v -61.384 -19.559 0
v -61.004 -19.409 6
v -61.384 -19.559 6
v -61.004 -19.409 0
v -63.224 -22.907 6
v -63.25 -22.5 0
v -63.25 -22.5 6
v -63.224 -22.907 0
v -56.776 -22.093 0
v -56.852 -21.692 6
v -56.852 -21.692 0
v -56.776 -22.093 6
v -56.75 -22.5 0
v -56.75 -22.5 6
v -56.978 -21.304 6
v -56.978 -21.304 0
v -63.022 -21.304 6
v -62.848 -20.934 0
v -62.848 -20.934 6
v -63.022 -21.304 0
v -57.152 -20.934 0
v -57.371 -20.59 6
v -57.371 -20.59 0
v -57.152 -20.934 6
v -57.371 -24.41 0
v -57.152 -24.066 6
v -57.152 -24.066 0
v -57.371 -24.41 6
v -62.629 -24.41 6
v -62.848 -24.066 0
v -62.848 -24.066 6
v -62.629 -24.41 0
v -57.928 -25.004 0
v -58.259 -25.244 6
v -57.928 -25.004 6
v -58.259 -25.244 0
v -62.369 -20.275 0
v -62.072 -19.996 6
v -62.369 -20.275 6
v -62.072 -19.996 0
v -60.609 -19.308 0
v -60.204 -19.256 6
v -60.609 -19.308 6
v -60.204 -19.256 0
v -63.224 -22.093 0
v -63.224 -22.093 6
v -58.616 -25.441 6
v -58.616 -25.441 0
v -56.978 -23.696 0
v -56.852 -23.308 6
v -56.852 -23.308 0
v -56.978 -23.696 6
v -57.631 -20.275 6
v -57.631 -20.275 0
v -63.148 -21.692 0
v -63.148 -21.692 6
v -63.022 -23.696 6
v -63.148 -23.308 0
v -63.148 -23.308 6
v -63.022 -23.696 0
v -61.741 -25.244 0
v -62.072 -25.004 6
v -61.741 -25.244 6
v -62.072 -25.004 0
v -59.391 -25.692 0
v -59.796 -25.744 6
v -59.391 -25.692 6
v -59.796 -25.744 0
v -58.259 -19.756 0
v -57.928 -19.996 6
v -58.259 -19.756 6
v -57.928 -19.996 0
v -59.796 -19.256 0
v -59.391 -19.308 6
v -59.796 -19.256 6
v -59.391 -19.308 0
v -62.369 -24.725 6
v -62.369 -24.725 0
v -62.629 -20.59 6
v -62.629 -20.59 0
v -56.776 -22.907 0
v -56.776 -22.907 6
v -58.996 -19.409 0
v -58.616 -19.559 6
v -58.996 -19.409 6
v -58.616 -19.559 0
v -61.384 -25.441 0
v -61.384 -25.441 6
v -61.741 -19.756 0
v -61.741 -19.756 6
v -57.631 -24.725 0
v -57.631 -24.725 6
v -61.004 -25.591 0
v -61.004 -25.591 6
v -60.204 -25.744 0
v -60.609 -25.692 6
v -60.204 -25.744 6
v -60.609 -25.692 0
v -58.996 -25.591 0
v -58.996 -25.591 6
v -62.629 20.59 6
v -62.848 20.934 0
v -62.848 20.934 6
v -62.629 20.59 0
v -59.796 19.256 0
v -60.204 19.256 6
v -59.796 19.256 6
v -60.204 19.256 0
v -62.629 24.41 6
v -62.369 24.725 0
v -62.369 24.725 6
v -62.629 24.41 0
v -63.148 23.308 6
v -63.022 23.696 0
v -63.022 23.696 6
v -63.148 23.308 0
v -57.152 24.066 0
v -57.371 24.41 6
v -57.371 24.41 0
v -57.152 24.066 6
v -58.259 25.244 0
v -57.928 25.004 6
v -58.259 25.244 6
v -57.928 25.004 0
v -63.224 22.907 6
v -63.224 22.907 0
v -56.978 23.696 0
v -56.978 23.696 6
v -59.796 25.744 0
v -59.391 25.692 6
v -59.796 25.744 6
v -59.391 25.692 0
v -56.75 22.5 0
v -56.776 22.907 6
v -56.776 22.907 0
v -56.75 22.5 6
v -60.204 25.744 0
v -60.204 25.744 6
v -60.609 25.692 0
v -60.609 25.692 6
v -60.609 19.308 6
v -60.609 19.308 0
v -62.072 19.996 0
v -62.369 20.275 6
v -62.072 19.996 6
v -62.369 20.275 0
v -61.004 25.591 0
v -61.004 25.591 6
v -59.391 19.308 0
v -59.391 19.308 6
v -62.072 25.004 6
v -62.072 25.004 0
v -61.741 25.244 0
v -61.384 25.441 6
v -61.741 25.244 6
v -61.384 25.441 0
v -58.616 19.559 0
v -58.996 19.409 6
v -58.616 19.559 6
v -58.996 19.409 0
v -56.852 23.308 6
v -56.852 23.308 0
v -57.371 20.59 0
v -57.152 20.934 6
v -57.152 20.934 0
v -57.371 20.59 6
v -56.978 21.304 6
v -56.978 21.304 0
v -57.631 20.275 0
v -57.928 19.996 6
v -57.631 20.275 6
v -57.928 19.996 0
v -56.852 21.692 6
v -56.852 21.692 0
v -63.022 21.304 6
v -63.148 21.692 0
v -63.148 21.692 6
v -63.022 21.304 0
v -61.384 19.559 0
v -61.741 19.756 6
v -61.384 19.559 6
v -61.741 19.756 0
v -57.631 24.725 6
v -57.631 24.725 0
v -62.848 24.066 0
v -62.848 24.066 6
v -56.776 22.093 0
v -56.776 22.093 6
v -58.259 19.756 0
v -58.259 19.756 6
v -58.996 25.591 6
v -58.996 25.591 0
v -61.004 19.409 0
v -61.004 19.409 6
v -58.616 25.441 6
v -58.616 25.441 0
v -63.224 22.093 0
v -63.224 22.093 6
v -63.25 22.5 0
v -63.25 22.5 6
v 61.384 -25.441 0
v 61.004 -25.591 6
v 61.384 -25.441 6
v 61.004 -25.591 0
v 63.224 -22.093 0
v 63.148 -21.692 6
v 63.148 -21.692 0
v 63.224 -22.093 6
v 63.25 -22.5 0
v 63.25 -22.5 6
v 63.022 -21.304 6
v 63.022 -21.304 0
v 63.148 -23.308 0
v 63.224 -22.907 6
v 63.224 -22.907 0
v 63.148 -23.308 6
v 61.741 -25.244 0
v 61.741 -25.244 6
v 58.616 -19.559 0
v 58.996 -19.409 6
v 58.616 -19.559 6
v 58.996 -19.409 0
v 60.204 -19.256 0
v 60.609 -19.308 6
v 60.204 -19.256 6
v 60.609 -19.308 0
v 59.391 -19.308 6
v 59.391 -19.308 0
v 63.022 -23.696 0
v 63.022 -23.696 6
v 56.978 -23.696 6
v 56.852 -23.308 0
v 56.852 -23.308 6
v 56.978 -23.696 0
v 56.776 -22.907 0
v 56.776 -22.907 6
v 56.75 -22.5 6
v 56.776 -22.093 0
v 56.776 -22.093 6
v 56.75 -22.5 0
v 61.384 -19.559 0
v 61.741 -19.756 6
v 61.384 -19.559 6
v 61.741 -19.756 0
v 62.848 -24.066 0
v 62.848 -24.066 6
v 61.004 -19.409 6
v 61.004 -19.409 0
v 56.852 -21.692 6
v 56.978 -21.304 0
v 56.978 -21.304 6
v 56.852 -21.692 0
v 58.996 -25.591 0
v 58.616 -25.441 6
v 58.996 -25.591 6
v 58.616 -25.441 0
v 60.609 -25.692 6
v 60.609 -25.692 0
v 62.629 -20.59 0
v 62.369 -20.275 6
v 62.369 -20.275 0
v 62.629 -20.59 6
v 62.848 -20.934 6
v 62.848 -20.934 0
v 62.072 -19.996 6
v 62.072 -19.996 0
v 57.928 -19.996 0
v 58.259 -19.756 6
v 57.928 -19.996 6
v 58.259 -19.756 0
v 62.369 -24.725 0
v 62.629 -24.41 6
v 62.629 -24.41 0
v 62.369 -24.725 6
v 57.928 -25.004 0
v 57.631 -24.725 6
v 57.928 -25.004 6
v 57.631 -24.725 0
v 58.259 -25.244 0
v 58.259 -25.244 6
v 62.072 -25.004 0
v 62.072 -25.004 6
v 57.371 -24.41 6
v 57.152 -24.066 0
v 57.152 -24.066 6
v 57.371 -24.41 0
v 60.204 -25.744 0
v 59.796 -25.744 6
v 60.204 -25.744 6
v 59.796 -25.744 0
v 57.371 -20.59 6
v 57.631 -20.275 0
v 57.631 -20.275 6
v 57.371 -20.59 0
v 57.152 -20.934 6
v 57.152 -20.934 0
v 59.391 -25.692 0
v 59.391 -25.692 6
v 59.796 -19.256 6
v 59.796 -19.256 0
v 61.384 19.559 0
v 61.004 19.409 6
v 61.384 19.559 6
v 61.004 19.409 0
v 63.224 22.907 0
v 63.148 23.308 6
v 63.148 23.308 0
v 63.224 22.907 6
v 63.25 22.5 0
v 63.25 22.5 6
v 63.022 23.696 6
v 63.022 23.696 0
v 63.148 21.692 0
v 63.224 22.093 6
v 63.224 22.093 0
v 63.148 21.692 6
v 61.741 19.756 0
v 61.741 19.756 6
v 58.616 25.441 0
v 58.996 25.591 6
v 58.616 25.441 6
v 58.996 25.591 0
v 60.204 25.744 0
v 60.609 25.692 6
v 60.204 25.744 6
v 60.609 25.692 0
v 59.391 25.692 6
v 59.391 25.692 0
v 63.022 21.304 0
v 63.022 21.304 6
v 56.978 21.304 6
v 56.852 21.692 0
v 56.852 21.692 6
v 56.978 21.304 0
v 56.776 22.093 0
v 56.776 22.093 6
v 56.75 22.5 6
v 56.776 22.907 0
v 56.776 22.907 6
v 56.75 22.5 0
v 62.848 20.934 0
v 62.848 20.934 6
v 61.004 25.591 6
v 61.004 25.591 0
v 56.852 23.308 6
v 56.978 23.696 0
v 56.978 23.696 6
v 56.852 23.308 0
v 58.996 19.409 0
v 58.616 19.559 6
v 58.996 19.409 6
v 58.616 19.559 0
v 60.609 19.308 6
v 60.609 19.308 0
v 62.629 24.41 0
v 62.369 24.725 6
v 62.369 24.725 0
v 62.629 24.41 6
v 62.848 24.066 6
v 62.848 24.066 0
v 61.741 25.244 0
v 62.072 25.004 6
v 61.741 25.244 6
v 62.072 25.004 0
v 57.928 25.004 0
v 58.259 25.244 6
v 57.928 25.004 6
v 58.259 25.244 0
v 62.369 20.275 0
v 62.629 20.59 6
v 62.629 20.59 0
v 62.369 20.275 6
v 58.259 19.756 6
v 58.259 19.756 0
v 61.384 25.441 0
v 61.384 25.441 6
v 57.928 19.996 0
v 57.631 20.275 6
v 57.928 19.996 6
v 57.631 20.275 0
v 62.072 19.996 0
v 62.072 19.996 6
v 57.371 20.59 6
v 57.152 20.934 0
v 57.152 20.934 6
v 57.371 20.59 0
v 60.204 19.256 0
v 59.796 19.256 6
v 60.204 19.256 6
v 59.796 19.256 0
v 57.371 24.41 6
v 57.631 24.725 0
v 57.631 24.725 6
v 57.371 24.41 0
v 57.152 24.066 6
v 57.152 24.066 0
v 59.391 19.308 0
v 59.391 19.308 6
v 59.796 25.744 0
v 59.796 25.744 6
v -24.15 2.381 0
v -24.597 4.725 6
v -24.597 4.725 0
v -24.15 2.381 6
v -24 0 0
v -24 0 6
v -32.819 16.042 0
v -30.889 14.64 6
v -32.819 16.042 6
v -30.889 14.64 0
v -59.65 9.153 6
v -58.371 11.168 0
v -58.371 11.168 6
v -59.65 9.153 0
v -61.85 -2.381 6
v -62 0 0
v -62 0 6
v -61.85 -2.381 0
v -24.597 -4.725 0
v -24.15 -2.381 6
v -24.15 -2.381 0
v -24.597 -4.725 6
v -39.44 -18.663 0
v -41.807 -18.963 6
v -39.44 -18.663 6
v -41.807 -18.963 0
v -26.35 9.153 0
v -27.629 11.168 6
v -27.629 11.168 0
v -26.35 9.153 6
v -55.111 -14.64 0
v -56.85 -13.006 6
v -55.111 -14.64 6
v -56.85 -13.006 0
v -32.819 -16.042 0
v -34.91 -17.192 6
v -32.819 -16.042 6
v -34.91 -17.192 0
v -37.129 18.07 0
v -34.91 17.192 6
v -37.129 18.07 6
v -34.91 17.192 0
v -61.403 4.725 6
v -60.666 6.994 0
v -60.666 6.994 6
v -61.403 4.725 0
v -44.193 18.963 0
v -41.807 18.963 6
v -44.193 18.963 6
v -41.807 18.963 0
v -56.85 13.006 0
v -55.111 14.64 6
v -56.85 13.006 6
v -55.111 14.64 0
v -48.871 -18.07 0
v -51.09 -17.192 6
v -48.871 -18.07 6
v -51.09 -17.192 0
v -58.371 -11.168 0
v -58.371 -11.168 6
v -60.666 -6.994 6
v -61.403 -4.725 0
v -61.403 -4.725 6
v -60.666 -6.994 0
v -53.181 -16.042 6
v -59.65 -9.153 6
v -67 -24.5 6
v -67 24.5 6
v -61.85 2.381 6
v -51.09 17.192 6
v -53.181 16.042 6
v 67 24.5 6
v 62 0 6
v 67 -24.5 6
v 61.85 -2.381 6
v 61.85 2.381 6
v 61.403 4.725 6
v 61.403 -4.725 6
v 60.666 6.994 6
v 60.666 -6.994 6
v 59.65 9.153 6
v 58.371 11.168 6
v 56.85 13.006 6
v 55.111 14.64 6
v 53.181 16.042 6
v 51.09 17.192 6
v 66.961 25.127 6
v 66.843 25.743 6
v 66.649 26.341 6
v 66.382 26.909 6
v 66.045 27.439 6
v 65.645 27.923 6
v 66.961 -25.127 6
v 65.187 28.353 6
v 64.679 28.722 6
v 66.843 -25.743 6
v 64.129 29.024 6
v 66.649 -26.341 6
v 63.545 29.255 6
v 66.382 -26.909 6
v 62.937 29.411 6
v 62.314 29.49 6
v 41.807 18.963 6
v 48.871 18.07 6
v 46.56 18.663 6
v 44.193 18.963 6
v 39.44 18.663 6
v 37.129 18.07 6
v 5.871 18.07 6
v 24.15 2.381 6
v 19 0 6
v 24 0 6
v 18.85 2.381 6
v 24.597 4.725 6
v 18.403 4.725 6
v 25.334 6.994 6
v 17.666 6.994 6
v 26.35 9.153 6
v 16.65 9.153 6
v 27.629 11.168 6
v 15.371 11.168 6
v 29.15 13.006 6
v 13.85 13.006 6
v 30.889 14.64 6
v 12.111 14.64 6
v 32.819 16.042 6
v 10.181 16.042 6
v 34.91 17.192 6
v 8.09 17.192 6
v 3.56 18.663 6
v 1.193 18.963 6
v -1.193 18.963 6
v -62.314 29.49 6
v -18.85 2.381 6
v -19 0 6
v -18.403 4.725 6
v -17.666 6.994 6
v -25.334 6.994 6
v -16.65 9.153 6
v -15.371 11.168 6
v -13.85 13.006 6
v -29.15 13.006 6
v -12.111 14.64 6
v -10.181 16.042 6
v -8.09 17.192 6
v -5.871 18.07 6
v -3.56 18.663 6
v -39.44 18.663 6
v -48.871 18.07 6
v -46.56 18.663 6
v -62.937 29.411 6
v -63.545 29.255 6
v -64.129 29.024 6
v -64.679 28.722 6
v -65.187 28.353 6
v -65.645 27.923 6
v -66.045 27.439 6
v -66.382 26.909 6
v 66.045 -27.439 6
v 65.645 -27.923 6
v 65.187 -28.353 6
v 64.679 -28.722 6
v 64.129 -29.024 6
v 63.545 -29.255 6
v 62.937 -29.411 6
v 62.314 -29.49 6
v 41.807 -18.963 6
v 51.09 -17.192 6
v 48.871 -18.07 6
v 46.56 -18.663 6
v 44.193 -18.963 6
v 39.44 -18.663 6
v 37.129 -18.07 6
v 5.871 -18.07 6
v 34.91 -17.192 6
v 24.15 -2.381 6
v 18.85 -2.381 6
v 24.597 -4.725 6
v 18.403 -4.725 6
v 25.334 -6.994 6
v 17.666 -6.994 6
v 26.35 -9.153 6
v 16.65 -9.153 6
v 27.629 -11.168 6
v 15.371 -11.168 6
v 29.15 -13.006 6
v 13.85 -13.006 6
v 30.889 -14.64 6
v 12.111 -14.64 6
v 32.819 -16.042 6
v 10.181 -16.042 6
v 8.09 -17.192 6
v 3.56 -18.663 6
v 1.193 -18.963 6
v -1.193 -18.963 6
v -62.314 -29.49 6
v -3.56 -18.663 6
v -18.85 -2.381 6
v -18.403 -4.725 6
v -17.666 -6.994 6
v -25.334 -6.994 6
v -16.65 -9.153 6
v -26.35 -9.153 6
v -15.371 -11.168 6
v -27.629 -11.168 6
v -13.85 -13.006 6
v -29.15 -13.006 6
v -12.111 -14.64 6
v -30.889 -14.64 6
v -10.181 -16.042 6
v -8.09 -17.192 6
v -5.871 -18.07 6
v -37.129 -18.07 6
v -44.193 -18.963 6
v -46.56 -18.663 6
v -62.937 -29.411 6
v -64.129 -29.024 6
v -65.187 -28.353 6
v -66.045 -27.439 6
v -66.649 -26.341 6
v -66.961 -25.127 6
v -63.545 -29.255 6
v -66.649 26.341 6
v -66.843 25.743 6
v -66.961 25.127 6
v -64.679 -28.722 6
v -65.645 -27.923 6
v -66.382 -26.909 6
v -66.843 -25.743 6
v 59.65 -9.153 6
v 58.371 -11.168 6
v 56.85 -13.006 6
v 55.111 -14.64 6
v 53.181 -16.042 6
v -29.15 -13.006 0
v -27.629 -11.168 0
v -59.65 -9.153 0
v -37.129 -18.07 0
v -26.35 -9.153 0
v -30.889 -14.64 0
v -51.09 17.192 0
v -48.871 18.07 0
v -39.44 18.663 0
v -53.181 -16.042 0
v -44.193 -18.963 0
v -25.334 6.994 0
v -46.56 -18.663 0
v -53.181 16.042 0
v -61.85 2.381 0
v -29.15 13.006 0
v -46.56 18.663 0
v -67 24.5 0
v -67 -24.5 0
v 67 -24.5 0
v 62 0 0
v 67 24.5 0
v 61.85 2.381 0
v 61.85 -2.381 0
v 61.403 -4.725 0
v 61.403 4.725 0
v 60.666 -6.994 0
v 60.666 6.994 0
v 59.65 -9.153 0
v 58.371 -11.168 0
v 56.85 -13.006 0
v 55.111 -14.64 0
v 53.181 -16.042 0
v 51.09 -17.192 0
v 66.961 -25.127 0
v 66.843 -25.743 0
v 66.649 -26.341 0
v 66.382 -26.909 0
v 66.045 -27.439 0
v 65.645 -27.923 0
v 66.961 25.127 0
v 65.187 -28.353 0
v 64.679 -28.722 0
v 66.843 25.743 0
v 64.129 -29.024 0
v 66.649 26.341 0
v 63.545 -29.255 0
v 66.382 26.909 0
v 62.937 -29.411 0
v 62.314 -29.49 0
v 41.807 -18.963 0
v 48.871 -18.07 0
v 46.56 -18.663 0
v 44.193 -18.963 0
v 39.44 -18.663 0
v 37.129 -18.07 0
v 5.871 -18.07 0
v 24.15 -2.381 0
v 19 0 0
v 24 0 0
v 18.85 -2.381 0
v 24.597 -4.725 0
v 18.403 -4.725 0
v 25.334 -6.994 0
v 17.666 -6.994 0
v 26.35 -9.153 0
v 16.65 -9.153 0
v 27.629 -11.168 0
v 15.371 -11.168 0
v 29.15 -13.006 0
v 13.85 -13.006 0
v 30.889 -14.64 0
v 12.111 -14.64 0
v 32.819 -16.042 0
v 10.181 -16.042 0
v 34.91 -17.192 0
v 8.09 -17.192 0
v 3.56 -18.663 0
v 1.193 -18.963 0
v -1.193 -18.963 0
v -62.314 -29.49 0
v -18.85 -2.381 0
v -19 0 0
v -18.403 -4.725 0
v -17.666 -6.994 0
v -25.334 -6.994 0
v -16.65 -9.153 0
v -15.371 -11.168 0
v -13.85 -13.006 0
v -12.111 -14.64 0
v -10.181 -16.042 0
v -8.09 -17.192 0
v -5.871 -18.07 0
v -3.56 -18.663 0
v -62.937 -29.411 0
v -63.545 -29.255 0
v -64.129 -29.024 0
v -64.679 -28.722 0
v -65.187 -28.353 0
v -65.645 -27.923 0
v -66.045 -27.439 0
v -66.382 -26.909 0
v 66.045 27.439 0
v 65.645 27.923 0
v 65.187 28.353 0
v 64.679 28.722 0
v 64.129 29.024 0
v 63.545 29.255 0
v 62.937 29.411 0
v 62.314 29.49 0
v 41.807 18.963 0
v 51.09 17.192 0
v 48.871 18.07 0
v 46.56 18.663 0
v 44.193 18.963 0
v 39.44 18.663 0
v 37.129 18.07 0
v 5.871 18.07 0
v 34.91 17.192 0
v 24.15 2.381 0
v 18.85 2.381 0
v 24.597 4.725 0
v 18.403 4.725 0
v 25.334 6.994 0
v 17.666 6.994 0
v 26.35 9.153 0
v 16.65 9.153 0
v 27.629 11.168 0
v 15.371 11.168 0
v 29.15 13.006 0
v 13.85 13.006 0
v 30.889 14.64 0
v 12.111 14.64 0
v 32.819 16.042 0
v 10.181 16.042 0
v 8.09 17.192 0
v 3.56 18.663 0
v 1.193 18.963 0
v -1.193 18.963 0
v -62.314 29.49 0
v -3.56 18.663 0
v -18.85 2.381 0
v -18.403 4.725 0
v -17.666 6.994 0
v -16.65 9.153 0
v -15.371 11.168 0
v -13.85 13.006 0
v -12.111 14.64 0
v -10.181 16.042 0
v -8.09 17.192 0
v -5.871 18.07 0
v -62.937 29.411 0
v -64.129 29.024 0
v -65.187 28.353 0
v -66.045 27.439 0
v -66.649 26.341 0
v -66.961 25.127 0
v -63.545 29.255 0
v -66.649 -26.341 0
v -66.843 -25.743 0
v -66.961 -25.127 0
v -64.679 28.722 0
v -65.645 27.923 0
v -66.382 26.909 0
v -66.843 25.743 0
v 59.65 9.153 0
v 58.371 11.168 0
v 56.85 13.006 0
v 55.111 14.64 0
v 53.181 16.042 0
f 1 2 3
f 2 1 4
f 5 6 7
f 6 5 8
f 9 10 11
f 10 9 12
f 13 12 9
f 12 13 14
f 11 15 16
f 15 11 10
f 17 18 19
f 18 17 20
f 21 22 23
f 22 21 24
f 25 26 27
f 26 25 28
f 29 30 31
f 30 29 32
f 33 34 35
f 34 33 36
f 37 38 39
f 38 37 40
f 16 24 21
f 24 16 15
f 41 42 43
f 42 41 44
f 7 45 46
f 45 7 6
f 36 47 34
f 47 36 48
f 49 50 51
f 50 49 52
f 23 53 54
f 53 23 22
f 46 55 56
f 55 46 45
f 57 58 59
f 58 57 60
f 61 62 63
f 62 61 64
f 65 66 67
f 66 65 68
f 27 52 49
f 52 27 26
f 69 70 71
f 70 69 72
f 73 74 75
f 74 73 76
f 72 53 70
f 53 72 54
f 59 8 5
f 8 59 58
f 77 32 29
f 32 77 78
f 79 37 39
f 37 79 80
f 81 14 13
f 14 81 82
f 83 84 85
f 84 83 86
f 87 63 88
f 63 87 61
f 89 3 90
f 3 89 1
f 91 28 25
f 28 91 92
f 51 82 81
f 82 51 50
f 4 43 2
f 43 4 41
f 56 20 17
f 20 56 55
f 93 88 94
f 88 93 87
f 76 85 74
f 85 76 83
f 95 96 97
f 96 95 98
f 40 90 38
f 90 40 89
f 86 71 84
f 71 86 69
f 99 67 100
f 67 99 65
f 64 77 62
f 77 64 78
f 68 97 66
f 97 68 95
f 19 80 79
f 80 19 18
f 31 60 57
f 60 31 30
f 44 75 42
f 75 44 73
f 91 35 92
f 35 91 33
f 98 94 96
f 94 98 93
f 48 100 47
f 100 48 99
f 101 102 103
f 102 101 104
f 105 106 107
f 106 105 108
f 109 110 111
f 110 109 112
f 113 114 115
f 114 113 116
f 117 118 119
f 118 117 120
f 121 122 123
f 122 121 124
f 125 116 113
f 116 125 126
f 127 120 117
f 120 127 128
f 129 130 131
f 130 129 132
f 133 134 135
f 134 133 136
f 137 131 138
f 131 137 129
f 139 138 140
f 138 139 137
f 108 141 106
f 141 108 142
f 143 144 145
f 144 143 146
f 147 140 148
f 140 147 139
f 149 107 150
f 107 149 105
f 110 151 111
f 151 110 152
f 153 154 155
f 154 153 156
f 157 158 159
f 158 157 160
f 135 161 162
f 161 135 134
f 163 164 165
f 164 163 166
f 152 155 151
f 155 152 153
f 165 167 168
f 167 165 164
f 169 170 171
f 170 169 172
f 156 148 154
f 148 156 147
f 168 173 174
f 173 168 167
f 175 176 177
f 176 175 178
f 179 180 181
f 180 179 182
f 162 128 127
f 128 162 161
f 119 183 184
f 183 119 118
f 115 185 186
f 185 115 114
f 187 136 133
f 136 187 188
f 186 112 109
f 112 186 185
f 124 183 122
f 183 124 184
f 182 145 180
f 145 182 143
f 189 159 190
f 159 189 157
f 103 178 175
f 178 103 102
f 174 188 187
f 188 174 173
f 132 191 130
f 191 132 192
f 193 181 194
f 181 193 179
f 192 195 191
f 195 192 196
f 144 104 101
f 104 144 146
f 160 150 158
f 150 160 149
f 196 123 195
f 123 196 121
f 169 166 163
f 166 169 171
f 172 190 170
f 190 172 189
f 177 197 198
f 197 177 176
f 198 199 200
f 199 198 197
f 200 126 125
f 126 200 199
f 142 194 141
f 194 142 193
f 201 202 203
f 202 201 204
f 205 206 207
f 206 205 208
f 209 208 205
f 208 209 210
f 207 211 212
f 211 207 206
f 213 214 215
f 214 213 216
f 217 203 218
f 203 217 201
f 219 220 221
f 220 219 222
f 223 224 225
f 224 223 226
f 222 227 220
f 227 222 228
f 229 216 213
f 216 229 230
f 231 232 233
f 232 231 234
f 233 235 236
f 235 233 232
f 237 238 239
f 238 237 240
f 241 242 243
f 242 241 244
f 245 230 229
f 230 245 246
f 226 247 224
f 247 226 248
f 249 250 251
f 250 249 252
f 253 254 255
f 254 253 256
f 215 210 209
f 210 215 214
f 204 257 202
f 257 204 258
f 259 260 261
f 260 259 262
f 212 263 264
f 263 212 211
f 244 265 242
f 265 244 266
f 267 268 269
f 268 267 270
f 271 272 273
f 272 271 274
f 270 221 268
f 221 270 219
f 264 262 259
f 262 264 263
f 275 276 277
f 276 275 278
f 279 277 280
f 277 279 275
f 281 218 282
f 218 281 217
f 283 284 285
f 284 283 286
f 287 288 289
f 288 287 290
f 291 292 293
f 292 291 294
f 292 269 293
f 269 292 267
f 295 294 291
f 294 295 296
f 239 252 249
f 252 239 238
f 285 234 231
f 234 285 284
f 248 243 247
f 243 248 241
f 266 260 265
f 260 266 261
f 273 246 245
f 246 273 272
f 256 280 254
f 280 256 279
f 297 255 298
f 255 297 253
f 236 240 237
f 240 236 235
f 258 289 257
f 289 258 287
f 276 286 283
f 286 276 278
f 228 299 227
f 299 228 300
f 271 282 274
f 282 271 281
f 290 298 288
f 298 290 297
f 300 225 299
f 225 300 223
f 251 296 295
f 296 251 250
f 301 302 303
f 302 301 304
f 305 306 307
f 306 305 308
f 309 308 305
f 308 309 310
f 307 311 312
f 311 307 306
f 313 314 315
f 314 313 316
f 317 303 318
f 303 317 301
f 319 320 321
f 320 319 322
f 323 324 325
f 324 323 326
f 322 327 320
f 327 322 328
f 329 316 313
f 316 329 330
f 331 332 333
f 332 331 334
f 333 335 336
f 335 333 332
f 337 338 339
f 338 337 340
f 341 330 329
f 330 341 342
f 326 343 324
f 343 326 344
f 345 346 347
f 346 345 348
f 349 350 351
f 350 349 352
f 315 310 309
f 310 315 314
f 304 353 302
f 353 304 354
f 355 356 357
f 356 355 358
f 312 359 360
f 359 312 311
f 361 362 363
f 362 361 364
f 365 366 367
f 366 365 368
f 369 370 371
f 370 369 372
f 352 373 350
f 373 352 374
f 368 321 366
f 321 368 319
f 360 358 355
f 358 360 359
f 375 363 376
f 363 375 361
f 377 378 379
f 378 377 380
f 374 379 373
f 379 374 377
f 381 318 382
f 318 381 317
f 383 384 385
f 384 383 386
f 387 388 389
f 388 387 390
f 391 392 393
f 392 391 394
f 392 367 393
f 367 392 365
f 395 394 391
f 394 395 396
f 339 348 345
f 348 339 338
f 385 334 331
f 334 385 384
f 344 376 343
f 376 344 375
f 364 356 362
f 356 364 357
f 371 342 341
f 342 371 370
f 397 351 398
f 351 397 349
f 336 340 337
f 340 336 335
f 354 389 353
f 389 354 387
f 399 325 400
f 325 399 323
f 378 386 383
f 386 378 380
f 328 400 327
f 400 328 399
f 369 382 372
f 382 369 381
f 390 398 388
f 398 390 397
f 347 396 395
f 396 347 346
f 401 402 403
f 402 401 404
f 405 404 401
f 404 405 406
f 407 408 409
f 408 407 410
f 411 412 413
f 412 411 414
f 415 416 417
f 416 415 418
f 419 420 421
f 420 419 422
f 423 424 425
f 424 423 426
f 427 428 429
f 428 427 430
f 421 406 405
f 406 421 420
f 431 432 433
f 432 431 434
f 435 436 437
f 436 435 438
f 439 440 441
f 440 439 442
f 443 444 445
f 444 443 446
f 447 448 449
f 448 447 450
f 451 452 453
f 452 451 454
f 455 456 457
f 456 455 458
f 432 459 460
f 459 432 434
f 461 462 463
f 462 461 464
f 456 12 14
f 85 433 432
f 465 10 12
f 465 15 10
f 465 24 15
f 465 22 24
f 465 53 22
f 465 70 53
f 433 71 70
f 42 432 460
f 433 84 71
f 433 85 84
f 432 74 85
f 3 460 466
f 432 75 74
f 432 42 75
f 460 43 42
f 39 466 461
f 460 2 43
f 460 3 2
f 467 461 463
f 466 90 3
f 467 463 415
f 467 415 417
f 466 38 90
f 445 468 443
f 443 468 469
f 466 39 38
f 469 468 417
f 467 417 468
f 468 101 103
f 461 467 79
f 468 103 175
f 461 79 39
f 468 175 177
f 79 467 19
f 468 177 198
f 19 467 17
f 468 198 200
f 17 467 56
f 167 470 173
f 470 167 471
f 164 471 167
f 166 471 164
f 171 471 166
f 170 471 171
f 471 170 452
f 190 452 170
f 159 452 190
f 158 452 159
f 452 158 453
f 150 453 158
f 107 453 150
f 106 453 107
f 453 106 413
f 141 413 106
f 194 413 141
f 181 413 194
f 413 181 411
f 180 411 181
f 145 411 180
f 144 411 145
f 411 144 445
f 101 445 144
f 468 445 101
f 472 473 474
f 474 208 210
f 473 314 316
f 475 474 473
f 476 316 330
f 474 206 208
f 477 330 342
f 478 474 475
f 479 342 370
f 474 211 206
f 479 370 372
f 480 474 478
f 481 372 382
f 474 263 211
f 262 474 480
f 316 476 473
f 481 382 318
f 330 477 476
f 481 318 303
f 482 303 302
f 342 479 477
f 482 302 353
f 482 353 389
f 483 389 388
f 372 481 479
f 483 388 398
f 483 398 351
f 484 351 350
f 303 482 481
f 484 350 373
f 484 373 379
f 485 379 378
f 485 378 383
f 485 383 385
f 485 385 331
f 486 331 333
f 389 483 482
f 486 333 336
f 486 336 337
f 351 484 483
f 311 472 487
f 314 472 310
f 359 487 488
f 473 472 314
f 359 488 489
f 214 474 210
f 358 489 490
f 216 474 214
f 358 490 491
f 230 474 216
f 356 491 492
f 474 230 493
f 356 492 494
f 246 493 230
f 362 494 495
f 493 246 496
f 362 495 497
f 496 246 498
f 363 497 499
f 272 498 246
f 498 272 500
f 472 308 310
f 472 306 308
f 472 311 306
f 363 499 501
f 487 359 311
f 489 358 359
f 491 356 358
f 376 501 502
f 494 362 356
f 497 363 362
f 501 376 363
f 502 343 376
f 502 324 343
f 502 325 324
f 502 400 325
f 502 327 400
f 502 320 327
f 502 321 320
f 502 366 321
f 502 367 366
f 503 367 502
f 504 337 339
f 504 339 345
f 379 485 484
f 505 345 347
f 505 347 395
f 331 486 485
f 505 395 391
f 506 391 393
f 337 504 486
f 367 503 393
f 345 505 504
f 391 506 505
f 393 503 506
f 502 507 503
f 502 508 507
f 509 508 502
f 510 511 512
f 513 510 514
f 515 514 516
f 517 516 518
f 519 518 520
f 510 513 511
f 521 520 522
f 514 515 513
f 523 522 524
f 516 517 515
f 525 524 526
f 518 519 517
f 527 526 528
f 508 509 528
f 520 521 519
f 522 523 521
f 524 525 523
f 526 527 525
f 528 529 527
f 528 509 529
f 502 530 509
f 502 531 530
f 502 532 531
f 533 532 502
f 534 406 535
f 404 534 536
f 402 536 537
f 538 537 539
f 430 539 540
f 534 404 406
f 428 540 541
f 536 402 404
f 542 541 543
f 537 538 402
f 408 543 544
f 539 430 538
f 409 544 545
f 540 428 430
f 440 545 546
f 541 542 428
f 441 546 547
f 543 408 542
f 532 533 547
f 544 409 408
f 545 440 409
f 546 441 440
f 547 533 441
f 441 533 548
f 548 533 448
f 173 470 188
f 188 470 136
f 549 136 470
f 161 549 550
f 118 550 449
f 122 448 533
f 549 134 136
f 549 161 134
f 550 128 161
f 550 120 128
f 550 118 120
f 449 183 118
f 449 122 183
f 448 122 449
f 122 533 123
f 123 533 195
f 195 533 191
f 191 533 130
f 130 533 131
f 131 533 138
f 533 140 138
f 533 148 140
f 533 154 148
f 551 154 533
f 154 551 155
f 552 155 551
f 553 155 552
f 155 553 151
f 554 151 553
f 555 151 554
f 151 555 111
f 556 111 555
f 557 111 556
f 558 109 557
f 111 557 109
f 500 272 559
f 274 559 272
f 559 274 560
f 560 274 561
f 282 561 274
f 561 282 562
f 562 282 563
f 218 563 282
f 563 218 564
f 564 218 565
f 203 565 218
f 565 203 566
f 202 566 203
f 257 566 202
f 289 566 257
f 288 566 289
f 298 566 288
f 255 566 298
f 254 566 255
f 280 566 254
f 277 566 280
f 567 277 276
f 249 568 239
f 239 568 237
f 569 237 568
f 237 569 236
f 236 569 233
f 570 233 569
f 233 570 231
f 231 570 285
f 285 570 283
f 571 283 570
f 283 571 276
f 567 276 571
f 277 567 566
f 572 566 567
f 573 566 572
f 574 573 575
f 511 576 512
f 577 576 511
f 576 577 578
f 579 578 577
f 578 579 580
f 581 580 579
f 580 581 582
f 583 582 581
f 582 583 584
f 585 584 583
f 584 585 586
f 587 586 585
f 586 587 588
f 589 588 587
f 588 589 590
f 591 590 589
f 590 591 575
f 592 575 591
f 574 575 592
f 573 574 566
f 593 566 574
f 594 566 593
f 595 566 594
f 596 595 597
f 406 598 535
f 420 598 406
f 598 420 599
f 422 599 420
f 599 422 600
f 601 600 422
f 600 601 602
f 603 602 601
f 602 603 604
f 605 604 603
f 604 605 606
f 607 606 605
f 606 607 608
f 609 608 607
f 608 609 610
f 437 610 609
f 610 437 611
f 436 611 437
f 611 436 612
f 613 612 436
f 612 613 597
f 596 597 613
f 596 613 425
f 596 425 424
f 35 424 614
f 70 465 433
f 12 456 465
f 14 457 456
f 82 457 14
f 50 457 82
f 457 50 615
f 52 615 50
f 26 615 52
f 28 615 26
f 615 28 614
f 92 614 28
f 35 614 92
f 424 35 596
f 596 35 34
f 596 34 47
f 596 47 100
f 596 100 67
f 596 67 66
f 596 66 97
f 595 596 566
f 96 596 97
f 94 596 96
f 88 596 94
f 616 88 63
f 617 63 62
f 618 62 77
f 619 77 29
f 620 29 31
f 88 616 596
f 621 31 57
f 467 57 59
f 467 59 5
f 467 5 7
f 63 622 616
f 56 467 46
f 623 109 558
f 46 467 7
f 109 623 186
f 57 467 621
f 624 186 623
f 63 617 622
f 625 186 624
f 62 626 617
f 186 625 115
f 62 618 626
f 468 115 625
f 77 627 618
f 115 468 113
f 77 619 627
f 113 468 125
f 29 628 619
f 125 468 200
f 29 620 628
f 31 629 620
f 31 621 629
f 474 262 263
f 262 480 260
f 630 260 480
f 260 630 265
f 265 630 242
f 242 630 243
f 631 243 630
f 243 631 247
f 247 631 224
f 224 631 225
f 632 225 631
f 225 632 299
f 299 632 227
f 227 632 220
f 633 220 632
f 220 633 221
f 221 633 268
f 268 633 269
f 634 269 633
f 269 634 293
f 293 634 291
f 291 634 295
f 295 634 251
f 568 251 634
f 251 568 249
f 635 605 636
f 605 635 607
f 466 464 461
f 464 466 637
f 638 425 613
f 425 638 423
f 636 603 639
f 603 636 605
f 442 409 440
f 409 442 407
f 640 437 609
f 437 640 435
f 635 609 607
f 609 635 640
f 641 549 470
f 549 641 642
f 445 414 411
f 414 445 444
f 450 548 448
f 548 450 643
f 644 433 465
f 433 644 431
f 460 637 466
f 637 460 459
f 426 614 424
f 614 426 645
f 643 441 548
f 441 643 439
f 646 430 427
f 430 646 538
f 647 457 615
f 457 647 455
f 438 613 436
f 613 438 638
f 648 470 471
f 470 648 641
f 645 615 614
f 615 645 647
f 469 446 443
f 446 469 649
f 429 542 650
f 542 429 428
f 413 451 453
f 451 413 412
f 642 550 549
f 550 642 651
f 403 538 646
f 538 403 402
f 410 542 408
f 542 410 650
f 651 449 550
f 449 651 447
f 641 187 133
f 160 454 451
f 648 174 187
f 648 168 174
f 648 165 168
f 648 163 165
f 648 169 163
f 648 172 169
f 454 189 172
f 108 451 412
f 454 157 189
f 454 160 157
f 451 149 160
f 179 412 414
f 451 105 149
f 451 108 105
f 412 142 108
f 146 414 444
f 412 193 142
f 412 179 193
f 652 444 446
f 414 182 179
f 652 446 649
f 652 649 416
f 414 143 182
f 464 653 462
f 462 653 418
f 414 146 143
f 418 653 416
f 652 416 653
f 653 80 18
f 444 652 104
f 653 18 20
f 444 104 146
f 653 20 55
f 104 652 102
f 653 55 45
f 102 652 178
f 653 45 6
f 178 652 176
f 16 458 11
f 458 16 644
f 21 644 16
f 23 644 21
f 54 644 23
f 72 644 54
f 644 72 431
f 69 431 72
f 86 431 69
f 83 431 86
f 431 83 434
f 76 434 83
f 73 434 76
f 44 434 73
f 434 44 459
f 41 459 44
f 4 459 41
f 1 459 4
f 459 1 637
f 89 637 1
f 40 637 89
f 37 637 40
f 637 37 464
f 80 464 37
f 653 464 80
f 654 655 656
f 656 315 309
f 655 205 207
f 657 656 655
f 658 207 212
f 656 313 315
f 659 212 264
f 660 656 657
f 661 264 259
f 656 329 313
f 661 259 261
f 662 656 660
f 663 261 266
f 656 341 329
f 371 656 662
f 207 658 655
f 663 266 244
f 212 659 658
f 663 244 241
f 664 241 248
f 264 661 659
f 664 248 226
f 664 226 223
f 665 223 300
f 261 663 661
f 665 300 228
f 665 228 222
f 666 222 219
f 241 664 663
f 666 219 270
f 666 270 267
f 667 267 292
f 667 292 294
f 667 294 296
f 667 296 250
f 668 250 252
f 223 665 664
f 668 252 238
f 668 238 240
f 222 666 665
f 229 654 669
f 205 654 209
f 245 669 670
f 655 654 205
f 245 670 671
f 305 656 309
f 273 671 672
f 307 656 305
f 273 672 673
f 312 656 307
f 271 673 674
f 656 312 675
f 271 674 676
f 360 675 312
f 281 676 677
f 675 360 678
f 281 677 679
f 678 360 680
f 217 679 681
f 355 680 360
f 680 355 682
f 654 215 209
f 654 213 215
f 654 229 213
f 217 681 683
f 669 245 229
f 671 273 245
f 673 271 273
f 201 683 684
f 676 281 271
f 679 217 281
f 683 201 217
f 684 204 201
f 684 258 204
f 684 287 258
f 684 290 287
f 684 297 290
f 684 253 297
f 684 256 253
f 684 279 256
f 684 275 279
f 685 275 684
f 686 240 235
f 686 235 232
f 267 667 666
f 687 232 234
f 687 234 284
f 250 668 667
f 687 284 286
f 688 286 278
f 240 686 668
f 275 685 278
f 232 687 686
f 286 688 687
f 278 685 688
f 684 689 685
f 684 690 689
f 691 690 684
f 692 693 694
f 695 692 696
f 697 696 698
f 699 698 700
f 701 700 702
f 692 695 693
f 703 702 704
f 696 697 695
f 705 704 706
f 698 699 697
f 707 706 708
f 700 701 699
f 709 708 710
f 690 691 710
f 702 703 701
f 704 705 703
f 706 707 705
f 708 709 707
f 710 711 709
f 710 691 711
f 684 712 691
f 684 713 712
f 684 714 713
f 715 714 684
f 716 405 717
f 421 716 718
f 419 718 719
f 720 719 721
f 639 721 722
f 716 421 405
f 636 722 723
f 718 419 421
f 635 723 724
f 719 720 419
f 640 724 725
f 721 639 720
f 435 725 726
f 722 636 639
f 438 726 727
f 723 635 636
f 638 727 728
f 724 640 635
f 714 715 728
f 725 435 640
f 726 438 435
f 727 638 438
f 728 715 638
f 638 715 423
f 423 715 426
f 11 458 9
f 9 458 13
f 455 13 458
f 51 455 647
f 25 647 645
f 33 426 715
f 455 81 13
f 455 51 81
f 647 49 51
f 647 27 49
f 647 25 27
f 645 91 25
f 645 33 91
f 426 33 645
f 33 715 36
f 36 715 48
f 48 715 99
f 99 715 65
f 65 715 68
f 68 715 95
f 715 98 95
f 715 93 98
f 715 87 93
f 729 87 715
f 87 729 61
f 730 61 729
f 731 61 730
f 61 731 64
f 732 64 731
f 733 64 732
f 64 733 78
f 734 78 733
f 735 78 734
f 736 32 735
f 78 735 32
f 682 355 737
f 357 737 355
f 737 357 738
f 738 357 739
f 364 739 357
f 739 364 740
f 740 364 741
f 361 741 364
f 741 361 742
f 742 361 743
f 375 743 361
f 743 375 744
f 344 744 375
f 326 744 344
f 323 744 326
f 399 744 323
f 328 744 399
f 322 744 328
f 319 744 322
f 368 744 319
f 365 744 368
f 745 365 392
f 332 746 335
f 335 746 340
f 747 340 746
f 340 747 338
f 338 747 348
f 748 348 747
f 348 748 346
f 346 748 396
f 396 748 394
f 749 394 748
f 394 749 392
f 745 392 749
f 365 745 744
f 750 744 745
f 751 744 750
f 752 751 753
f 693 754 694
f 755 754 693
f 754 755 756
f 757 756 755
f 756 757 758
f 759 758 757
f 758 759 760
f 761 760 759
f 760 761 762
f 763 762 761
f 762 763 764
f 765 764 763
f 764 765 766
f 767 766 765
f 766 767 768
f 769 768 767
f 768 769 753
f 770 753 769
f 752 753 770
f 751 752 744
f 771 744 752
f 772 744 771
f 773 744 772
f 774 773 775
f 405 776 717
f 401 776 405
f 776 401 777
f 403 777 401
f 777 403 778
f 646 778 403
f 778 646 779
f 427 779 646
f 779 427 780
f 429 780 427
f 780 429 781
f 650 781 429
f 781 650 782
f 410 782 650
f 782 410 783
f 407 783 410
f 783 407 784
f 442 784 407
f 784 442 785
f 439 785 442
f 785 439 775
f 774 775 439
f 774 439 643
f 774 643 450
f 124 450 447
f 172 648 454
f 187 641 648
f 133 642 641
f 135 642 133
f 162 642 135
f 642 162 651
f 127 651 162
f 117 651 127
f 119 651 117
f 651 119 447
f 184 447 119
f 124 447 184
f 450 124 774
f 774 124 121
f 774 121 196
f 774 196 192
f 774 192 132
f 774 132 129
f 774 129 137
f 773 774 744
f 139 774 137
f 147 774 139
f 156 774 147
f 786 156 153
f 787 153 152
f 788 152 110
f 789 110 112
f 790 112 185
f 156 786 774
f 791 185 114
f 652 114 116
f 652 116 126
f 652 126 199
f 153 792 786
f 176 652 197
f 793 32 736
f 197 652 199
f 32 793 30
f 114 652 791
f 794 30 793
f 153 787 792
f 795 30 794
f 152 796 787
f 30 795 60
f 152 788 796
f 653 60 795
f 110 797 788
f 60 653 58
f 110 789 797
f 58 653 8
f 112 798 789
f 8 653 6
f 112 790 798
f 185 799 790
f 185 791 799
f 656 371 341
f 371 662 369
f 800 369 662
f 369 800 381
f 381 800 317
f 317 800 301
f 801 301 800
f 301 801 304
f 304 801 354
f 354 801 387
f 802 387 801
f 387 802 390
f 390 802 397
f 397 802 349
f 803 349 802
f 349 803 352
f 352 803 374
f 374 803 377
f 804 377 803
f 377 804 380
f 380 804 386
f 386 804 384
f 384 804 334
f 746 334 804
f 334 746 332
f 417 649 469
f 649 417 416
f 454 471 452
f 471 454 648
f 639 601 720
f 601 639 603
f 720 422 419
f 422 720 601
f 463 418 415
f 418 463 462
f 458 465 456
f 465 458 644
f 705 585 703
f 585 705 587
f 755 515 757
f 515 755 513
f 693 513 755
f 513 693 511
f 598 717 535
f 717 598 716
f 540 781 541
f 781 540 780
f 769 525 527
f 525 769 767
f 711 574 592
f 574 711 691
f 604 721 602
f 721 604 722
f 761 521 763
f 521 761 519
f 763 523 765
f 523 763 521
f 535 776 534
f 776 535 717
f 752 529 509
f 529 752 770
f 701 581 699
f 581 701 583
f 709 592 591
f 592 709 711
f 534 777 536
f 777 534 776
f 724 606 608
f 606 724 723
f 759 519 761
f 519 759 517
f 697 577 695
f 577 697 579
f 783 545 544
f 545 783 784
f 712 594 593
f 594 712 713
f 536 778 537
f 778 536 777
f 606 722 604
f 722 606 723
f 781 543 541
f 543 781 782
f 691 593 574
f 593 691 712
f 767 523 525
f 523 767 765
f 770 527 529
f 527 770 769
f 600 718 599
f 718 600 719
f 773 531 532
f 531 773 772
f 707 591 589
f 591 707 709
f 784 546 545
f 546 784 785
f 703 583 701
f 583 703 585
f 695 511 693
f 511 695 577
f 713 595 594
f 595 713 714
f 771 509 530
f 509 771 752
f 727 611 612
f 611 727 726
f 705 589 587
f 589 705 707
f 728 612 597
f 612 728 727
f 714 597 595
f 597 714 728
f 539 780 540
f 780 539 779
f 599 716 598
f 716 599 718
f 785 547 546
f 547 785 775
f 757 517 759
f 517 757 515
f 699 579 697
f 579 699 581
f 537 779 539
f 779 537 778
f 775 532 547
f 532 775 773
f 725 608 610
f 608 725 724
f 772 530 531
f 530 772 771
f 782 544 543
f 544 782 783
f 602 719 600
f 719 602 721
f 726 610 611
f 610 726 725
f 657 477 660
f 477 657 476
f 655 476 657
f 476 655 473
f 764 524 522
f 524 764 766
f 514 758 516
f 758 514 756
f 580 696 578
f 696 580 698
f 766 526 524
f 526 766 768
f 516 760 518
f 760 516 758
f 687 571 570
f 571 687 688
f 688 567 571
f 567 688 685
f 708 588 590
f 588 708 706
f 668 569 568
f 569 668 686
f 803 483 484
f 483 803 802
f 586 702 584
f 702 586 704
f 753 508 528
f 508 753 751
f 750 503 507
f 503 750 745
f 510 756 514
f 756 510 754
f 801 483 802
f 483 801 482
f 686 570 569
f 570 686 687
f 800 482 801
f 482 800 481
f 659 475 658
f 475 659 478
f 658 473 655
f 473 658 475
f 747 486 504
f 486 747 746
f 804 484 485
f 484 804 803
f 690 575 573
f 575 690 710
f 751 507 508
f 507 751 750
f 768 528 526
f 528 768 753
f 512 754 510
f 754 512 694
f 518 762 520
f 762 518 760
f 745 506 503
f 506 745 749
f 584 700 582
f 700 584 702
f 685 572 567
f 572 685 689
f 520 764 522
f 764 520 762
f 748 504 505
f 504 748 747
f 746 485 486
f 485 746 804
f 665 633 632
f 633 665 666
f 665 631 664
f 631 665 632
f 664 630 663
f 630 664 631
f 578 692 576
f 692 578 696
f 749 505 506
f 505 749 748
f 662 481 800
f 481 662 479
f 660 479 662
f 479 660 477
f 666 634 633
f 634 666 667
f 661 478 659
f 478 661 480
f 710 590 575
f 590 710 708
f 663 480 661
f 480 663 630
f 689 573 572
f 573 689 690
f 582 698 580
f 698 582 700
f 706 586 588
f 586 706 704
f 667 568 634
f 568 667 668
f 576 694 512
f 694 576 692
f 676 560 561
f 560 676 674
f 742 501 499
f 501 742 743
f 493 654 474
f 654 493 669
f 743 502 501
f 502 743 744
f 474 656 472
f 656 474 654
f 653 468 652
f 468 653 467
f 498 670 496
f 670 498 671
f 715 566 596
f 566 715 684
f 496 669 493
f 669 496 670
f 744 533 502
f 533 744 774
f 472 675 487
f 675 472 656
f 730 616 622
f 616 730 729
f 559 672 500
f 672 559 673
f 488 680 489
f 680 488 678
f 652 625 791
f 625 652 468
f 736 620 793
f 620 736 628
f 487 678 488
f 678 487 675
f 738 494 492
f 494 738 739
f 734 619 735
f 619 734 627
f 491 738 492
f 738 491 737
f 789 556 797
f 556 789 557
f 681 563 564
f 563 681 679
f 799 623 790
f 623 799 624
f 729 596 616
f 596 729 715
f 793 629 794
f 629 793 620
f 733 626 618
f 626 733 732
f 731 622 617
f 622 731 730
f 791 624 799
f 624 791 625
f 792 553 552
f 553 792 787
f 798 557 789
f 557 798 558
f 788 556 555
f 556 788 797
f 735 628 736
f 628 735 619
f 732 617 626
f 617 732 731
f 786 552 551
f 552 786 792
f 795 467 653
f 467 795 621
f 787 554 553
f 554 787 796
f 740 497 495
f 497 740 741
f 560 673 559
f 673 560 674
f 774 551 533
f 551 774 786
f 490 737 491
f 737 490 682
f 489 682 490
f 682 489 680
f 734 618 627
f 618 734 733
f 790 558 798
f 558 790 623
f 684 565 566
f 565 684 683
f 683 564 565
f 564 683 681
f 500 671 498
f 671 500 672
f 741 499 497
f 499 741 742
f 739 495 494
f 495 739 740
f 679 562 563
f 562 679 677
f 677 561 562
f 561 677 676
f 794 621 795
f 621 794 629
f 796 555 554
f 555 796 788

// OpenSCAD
$fn = 50;


difference() {
	union() {
		hull() {
			translate(v = [-62.0000000000, 24.5000000000, 0]) {
				cylinder(h = 6, r = 5);
			}
			translate(v = [62.0000000000, 24.5000000000, 0]) {
				cylinder(h = 6, r = 5);
			}
			translate(v = [-62.0000000000, -24.5000000000, 0]) {
				cylinder(h = 6, r = 5);
			}
			translate(v = [62.0000000000, -24.5000000000, 0]) {
				cylinder(h = 6, r = 5);
			}
		}
	}
	union() {
		#translate(v = [-60.0000000000, -22.5000000000, -100.0000000000]) {
			cylinder(h = 200, r = 3.2500000000);
		}
		#translate(v = [-60.0000000000, 22.5000000000, -100.0000000000]) {
			cylinder(h = 200, r = 3.2500000000);
		}
		#translate(v = [60.0000000000, -22.5000000000, -100.0000000000]) {
			cylinder(h = 200, r = 3.2500000000);
		}
		#translate(v = [60.0000000000, 22.5000000000, -100.0000000000]) {
			cylinder(h = 200, r = 3.2500000000);
		}
		#translate(v = [-43.0000000000, 0, 0]) {
			cylinder(h = 6, r = 19.0000000000);
		}
		#cylinder(h = 6, r = 19.0000000000);
		#translate(v = [43.0000000000, 0, 0]) {
			cylinder(h = 6, r = 19.0000000000);
		}
	}
}
